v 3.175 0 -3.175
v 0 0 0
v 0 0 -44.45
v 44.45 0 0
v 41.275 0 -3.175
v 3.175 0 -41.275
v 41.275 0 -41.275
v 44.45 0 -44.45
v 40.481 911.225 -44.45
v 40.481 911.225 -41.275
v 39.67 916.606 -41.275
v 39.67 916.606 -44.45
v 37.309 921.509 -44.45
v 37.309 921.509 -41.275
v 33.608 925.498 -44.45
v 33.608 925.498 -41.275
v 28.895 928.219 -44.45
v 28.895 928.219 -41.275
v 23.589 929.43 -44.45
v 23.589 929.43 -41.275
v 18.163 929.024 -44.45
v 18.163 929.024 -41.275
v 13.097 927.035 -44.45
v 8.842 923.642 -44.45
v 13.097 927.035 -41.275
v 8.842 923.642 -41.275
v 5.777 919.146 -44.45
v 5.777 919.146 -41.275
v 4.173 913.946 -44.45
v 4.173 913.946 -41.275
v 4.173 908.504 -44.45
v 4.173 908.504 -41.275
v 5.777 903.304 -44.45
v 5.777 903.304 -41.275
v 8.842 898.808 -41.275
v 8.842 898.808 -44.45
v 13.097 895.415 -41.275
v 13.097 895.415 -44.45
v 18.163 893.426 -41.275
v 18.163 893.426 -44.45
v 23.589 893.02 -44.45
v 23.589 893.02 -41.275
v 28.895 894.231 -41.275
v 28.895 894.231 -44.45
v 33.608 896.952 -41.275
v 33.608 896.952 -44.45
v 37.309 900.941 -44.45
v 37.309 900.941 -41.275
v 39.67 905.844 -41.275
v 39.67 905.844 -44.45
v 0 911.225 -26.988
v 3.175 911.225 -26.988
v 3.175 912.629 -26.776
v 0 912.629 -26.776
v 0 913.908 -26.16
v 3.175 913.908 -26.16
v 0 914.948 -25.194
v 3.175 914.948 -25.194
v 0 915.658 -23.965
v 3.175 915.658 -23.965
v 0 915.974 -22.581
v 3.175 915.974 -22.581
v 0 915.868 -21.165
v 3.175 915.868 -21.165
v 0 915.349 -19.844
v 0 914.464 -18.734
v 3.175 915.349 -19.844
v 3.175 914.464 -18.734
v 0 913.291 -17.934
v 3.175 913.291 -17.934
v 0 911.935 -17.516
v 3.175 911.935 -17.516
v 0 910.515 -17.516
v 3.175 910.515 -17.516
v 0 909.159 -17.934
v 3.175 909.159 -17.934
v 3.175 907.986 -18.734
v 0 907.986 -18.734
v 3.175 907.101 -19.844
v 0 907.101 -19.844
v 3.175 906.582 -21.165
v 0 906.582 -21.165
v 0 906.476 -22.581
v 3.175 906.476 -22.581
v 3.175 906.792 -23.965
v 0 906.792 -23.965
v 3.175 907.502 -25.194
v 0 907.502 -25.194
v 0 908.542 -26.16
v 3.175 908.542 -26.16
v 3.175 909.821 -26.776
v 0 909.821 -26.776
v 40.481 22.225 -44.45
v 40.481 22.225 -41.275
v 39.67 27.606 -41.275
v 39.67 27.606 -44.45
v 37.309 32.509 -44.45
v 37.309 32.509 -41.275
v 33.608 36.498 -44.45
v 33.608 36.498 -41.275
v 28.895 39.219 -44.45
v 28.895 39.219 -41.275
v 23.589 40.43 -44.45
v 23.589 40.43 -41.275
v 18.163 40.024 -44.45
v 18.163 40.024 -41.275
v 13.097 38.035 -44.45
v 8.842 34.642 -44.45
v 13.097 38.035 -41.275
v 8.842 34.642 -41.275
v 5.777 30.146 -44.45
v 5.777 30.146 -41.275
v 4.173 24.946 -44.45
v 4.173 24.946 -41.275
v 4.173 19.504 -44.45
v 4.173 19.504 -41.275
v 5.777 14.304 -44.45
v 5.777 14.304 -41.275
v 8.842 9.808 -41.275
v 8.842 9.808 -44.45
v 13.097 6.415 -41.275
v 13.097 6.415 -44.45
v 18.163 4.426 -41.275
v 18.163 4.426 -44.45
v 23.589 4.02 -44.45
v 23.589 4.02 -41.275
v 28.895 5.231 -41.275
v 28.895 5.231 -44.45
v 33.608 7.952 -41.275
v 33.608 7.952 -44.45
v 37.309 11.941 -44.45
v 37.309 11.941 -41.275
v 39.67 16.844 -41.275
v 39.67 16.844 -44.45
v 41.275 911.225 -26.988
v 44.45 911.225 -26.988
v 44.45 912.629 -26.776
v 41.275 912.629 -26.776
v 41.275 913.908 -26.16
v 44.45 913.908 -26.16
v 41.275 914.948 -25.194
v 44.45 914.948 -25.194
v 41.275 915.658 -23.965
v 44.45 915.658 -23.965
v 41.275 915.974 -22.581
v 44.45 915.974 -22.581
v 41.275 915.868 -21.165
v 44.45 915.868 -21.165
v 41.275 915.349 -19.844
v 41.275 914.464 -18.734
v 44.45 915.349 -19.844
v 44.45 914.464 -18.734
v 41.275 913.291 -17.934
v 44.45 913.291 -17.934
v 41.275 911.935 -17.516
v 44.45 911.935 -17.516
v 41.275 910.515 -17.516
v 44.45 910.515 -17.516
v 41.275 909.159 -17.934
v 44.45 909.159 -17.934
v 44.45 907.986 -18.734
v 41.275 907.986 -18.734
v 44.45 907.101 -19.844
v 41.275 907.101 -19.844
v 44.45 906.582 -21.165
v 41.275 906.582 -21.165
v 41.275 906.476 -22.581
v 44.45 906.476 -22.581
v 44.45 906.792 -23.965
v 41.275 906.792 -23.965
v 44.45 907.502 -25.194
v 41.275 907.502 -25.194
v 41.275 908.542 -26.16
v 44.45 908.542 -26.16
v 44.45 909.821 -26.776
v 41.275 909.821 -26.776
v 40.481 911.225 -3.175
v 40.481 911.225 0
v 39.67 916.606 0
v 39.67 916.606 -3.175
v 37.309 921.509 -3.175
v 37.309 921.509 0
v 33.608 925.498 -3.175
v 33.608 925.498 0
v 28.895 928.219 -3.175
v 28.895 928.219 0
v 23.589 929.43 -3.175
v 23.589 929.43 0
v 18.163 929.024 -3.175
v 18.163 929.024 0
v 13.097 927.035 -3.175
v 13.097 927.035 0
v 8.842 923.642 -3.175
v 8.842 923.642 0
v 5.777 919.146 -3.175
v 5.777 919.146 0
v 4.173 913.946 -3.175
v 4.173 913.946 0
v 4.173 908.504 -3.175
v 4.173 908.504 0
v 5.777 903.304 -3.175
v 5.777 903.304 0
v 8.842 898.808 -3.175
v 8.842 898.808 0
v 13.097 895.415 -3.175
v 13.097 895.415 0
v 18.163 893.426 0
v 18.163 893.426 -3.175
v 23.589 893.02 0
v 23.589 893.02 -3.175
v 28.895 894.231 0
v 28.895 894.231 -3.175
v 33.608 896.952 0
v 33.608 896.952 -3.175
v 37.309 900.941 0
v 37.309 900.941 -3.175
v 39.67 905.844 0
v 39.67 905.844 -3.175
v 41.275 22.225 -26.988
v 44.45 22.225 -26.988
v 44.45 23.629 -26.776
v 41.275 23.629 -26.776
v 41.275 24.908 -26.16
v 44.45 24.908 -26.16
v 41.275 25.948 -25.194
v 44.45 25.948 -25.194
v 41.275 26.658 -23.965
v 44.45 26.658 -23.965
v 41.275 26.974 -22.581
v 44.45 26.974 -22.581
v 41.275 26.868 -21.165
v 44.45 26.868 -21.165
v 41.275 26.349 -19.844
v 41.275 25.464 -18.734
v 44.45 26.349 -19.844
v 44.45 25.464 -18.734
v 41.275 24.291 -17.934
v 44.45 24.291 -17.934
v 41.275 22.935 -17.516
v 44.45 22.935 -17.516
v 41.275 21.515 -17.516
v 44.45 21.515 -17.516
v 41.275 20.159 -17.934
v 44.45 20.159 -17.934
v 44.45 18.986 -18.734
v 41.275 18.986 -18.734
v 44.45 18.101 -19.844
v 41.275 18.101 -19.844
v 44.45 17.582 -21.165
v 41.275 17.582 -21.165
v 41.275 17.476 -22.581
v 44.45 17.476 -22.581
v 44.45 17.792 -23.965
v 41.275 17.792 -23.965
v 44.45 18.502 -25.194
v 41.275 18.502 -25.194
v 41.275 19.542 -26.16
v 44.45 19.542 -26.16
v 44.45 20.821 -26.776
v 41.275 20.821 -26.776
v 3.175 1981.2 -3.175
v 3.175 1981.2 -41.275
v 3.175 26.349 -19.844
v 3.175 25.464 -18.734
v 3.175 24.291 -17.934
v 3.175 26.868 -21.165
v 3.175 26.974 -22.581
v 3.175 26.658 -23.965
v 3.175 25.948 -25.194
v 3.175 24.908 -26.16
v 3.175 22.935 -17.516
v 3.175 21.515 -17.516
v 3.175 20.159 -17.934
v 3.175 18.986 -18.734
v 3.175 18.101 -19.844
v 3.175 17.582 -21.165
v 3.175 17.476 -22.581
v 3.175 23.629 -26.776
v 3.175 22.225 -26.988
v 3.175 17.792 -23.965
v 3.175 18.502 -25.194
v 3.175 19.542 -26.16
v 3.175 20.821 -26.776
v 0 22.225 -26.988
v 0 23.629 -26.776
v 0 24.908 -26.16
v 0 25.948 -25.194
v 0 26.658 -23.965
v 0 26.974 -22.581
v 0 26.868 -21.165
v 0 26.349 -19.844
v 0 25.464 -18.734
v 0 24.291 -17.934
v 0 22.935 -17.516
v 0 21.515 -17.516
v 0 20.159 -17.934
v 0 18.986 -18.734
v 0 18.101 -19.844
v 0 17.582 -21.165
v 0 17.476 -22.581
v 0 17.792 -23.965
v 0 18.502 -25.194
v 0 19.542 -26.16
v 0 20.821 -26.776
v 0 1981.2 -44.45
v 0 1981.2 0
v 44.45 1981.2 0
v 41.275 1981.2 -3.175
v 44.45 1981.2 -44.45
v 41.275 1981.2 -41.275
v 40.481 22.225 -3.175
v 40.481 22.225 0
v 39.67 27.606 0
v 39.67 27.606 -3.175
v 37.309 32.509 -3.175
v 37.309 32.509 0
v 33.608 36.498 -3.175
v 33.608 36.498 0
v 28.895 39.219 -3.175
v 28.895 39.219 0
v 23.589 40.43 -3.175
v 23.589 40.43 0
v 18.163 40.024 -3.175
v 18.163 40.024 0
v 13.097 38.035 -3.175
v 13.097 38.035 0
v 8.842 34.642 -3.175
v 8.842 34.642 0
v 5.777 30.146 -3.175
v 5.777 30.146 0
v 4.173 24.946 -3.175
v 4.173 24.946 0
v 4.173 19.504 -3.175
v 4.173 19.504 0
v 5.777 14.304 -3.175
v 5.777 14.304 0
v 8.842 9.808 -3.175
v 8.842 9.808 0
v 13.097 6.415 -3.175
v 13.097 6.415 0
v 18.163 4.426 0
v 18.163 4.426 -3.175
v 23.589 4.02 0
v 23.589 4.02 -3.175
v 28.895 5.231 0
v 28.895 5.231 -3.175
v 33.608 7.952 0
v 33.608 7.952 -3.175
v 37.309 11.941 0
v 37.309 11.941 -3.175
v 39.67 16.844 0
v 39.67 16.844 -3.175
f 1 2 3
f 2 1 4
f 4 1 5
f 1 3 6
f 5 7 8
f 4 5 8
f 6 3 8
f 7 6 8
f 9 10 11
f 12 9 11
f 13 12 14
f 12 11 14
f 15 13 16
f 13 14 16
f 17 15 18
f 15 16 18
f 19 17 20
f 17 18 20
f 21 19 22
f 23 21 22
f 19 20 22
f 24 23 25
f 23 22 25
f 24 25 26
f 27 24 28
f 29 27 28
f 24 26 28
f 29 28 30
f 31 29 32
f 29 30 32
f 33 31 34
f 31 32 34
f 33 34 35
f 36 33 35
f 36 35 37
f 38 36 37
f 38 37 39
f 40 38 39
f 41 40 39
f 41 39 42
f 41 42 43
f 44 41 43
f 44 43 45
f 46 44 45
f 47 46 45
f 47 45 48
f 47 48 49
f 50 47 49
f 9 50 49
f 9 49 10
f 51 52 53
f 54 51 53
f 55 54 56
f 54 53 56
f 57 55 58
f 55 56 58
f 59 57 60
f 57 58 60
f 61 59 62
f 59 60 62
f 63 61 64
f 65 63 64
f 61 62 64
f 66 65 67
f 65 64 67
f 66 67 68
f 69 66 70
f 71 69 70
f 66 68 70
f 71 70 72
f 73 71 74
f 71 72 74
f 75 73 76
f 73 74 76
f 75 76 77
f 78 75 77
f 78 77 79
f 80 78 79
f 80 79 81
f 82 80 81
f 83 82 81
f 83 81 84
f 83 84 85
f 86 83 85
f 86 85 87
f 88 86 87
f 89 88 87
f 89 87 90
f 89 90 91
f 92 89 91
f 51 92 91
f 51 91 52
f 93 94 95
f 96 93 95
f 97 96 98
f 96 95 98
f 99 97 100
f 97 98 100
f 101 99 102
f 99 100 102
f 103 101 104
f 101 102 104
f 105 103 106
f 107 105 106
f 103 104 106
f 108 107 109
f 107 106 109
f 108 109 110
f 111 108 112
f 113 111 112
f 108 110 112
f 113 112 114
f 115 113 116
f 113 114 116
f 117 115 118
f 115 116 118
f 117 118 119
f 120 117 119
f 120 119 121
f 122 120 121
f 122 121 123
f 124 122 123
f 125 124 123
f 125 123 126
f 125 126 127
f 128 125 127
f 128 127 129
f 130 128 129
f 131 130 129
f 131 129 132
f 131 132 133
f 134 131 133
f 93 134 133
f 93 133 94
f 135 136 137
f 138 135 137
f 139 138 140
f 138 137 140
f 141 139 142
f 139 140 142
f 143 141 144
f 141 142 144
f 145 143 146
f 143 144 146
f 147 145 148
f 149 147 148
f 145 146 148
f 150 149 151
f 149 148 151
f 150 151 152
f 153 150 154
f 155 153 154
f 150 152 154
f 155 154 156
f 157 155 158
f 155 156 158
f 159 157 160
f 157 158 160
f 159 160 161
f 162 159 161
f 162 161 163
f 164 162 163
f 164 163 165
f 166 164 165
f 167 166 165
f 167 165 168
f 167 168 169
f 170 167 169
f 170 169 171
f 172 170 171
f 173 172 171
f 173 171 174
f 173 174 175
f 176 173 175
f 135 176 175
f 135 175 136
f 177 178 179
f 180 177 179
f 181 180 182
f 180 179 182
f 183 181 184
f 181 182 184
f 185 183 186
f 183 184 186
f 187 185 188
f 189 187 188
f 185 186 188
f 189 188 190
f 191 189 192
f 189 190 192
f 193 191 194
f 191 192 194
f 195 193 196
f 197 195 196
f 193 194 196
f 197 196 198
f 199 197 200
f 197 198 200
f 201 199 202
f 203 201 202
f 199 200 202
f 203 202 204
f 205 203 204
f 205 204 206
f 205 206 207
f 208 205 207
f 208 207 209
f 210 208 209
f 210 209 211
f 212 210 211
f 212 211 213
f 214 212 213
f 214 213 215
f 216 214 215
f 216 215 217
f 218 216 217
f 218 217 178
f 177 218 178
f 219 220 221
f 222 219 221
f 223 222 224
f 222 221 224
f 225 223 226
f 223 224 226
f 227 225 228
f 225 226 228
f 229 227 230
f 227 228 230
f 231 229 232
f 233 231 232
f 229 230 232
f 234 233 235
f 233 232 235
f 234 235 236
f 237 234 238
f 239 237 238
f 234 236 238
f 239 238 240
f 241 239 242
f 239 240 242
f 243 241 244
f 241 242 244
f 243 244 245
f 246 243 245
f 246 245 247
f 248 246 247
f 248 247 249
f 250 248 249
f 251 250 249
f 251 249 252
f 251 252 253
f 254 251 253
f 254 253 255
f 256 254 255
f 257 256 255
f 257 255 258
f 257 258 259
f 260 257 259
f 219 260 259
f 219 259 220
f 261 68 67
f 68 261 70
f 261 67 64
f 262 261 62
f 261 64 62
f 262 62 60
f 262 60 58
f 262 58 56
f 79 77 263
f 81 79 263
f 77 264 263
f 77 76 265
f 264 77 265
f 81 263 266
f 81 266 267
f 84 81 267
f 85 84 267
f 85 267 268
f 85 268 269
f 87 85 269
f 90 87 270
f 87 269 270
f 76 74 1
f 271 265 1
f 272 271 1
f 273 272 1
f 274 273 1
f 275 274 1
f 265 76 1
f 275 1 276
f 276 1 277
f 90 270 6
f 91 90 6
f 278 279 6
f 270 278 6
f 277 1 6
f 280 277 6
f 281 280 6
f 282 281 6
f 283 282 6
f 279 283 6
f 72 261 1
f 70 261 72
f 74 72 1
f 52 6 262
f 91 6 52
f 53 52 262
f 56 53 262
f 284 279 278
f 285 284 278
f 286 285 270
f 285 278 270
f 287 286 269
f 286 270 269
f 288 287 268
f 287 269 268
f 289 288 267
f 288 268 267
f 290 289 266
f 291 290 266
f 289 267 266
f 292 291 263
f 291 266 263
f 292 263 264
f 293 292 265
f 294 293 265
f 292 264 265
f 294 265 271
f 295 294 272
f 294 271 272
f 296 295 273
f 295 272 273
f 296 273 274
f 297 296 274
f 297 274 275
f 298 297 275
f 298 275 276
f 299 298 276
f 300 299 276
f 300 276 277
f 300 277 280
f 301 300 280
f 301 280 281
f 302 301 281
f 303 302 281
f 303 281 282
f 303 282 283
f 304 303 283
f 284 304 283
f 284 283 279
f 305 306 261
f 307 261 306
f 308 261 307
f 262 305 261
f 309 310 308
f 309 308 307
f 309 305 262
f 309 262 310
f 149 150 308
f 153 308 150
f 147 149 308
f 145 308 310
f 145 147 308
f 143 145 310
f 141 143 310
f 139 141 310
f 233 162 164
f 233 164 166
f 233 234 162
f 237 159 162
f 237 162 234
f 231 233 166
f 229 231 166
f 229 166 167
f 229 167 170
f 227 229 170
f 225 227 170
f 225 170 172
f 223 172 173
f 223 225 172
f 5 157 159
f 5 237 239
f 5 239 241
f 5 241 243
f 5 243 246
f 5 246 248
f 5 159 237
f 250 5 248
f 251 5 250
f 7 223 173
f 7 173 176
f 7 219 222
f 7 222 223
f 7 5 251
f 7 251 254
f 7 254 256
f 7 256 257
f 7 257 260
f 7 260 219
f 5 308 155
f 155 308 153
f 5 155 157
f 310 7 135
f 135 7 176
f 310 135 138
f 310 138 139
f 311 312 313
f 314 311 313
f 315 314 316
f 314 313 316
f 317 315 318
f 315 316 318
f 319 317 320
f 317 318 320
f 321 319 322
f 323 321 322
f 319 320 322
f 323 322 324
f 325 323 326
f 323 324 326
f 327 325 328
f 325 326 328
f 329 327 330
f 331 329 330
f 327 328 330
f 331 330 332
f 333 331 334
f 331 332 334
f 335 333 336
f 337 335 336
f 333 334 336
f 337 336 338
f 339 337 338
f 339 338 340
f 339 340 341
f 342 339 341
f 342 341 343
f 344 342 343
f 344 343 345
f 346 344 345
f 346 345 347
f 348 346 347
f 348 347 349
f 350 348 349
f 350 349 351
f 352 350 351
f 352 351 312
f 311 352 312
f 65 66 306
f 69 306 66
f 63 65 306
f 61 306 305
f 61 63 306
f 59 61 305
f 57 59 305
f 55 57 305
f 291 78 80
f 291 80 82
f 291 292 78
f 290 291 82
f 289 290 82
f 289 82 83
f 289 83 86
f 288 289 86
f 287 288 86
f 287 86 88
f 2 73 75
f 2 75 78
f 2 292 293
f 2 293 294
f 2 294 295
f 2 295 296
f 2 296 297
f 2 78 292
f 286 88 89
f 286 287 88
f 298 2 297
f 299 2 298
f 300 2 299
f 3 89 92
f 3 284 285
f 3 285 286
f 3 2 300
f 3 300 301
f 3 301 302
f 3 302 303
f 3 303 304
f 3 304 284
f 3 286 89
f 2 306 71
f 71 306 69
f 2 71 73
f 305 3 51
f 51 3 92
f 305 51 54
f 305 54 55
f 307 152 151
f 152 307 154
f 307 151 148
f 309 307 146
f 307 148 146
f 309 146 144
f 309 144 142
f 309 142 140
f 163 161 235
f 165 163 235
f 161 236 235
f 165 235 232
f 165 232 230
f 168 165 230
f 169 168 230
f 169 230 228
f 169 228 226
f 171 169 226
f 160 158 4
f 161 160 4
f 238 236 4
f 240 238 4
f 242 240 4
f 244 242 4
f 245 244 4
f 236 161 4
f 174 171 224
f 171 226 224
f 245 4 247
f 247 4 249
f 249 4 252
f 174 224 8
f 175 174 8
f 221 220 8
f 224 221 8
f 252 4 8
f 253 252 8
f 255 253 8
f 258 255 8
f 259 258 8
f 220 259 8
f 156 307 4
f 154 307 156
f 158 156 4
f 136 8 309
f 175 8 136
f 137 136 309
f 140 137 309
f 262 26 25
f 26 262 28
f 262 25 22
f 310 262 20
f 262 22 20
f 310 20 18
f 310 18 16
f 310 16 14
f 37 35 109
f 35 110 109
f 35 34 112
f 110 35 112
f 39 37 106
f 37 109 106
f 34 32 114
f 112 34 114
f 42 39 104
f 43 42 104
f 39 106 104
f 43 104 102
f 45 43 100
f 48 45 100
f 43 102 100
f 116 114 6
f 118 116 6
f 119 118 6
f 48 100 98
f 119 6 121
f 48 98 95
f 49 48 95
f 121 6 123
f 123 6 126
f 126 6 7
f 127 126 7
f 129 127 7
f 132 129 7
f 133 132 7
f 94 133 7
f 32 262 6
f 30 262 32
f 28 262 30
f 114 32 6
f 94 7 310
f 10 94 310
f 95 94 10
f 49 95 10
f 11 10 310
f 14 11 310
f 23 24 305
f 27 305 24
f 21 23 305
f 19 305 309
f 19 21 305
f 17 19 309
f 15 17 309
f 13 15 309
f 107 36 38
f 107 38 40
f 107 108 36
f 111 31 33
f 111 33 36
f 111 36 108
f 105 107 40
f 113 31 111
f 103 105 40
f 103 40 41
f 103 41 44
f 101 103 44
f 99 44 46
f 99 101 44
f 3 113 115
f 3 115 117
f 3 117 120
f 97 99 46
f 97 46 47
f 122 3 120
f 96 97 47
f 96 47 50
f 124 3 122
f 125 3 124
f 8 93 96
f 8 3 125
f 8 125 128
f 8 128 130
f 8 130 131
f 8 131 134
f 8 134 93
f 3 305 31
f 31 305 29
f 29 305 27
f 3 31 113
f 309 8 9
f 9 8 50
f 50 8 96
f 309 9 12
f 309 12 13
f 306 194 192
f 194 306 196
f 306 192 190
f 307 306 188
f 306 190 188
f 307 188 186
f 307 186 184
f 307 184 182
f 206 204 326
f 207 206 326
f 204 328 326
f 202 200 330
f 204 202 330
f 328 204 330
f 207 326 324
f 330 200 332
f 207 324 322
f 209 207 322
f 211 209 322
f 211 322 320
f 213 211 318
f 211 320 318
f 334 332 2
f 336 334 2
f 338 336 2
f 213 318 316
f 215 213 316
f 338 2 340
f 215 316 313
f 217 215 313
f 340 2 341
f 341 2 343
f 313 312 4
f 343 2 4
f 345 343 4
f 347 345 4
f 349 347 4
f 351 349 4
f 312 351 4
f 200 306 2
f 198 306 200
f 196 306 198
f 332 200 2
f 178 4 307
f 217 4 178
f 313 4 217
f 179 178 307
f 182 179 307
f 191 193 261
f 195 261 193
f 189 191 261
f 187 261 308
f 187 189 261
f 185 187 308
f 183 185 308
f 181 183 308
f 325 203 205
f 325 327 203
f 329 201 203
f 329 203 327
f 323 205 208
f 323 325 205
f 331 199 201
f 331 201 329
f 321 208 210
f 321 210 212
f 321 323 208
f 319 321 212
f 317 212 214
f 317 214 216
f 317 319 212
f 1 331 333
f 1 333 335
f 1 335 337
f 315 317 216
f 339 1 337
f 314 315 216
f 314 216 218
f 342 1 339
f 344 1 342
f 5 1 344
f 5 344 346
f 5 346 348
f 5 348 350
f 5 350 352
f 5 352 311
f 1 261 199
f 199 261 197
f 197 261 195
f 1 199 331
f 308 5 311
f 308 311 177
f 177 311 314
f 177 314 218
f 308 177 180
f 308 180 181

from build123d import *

# Parameters (mm, degrees)
SKETCH1_W           = 44.45
SKETCH1_H           = 44.45
SKETCH1_W_2         = 38.1
SKETCH1_H_2         = 38.1
BOSS_EXTRUDE1_DEPTH = 1981.2
SKETCH2_R           = 18.25625
CUT_EXTRUDE1_DEPTH  = 45.45
SKETCH3_R           = 4.7625
CUT_EXTRUDE2_DEPTH  = 45.45


with BuildPart() as part:
    # Sketch1 → Boss-Extrude1 (new body)
    with BuildSketch(Plane(origin=(0, 0, 0), x_dir=(1, 0, 0), z_dir=(0, 1, 0))):
        with Locations((22.225, 22.225)):
            Rectangle(SKETCH1_W, SKETCH1_H)
        with Locations((22.225, 22.225)):
            Rectangle(SKETCH1_W_2, SKETCH1_H_2, mode=Mode.SUBTRACT)
    extrude(amount=BOSS_EXTRUDE1_DEPTH)

    # Sketch2 → Cut-Extrude1 (cut, through all)
    with BuildSketch(Plane.XY):
        with Locations((22.225, 22.225)):
            Circle(SKETCH2_R)
        with Locations((22.225, 911.225)):
            Circle(SKETCH2_R)
    extrude(amount=-CUT_EXTRUDE1_DEPTH, mode=Mode.SUBTRACT)

    # Sketch3 → Cut-Extrude2 (cut, through all)
    with BuildSketch(Plane(origin=(44.45, 0, 0), x_dir=(0, 0, -1), z_dir=(1, 0, 0))):
        with Locations((22.225, 22.225)):
            Circle(SKETCH3_R)
        with Locations((22.225, 911.225)):
            Circle(SKETCH3_R)
    extrude(amount=-CUT_EXTRUDE2_DEPTH, mode=Mode.SUBTRACT)


solid = part.part
